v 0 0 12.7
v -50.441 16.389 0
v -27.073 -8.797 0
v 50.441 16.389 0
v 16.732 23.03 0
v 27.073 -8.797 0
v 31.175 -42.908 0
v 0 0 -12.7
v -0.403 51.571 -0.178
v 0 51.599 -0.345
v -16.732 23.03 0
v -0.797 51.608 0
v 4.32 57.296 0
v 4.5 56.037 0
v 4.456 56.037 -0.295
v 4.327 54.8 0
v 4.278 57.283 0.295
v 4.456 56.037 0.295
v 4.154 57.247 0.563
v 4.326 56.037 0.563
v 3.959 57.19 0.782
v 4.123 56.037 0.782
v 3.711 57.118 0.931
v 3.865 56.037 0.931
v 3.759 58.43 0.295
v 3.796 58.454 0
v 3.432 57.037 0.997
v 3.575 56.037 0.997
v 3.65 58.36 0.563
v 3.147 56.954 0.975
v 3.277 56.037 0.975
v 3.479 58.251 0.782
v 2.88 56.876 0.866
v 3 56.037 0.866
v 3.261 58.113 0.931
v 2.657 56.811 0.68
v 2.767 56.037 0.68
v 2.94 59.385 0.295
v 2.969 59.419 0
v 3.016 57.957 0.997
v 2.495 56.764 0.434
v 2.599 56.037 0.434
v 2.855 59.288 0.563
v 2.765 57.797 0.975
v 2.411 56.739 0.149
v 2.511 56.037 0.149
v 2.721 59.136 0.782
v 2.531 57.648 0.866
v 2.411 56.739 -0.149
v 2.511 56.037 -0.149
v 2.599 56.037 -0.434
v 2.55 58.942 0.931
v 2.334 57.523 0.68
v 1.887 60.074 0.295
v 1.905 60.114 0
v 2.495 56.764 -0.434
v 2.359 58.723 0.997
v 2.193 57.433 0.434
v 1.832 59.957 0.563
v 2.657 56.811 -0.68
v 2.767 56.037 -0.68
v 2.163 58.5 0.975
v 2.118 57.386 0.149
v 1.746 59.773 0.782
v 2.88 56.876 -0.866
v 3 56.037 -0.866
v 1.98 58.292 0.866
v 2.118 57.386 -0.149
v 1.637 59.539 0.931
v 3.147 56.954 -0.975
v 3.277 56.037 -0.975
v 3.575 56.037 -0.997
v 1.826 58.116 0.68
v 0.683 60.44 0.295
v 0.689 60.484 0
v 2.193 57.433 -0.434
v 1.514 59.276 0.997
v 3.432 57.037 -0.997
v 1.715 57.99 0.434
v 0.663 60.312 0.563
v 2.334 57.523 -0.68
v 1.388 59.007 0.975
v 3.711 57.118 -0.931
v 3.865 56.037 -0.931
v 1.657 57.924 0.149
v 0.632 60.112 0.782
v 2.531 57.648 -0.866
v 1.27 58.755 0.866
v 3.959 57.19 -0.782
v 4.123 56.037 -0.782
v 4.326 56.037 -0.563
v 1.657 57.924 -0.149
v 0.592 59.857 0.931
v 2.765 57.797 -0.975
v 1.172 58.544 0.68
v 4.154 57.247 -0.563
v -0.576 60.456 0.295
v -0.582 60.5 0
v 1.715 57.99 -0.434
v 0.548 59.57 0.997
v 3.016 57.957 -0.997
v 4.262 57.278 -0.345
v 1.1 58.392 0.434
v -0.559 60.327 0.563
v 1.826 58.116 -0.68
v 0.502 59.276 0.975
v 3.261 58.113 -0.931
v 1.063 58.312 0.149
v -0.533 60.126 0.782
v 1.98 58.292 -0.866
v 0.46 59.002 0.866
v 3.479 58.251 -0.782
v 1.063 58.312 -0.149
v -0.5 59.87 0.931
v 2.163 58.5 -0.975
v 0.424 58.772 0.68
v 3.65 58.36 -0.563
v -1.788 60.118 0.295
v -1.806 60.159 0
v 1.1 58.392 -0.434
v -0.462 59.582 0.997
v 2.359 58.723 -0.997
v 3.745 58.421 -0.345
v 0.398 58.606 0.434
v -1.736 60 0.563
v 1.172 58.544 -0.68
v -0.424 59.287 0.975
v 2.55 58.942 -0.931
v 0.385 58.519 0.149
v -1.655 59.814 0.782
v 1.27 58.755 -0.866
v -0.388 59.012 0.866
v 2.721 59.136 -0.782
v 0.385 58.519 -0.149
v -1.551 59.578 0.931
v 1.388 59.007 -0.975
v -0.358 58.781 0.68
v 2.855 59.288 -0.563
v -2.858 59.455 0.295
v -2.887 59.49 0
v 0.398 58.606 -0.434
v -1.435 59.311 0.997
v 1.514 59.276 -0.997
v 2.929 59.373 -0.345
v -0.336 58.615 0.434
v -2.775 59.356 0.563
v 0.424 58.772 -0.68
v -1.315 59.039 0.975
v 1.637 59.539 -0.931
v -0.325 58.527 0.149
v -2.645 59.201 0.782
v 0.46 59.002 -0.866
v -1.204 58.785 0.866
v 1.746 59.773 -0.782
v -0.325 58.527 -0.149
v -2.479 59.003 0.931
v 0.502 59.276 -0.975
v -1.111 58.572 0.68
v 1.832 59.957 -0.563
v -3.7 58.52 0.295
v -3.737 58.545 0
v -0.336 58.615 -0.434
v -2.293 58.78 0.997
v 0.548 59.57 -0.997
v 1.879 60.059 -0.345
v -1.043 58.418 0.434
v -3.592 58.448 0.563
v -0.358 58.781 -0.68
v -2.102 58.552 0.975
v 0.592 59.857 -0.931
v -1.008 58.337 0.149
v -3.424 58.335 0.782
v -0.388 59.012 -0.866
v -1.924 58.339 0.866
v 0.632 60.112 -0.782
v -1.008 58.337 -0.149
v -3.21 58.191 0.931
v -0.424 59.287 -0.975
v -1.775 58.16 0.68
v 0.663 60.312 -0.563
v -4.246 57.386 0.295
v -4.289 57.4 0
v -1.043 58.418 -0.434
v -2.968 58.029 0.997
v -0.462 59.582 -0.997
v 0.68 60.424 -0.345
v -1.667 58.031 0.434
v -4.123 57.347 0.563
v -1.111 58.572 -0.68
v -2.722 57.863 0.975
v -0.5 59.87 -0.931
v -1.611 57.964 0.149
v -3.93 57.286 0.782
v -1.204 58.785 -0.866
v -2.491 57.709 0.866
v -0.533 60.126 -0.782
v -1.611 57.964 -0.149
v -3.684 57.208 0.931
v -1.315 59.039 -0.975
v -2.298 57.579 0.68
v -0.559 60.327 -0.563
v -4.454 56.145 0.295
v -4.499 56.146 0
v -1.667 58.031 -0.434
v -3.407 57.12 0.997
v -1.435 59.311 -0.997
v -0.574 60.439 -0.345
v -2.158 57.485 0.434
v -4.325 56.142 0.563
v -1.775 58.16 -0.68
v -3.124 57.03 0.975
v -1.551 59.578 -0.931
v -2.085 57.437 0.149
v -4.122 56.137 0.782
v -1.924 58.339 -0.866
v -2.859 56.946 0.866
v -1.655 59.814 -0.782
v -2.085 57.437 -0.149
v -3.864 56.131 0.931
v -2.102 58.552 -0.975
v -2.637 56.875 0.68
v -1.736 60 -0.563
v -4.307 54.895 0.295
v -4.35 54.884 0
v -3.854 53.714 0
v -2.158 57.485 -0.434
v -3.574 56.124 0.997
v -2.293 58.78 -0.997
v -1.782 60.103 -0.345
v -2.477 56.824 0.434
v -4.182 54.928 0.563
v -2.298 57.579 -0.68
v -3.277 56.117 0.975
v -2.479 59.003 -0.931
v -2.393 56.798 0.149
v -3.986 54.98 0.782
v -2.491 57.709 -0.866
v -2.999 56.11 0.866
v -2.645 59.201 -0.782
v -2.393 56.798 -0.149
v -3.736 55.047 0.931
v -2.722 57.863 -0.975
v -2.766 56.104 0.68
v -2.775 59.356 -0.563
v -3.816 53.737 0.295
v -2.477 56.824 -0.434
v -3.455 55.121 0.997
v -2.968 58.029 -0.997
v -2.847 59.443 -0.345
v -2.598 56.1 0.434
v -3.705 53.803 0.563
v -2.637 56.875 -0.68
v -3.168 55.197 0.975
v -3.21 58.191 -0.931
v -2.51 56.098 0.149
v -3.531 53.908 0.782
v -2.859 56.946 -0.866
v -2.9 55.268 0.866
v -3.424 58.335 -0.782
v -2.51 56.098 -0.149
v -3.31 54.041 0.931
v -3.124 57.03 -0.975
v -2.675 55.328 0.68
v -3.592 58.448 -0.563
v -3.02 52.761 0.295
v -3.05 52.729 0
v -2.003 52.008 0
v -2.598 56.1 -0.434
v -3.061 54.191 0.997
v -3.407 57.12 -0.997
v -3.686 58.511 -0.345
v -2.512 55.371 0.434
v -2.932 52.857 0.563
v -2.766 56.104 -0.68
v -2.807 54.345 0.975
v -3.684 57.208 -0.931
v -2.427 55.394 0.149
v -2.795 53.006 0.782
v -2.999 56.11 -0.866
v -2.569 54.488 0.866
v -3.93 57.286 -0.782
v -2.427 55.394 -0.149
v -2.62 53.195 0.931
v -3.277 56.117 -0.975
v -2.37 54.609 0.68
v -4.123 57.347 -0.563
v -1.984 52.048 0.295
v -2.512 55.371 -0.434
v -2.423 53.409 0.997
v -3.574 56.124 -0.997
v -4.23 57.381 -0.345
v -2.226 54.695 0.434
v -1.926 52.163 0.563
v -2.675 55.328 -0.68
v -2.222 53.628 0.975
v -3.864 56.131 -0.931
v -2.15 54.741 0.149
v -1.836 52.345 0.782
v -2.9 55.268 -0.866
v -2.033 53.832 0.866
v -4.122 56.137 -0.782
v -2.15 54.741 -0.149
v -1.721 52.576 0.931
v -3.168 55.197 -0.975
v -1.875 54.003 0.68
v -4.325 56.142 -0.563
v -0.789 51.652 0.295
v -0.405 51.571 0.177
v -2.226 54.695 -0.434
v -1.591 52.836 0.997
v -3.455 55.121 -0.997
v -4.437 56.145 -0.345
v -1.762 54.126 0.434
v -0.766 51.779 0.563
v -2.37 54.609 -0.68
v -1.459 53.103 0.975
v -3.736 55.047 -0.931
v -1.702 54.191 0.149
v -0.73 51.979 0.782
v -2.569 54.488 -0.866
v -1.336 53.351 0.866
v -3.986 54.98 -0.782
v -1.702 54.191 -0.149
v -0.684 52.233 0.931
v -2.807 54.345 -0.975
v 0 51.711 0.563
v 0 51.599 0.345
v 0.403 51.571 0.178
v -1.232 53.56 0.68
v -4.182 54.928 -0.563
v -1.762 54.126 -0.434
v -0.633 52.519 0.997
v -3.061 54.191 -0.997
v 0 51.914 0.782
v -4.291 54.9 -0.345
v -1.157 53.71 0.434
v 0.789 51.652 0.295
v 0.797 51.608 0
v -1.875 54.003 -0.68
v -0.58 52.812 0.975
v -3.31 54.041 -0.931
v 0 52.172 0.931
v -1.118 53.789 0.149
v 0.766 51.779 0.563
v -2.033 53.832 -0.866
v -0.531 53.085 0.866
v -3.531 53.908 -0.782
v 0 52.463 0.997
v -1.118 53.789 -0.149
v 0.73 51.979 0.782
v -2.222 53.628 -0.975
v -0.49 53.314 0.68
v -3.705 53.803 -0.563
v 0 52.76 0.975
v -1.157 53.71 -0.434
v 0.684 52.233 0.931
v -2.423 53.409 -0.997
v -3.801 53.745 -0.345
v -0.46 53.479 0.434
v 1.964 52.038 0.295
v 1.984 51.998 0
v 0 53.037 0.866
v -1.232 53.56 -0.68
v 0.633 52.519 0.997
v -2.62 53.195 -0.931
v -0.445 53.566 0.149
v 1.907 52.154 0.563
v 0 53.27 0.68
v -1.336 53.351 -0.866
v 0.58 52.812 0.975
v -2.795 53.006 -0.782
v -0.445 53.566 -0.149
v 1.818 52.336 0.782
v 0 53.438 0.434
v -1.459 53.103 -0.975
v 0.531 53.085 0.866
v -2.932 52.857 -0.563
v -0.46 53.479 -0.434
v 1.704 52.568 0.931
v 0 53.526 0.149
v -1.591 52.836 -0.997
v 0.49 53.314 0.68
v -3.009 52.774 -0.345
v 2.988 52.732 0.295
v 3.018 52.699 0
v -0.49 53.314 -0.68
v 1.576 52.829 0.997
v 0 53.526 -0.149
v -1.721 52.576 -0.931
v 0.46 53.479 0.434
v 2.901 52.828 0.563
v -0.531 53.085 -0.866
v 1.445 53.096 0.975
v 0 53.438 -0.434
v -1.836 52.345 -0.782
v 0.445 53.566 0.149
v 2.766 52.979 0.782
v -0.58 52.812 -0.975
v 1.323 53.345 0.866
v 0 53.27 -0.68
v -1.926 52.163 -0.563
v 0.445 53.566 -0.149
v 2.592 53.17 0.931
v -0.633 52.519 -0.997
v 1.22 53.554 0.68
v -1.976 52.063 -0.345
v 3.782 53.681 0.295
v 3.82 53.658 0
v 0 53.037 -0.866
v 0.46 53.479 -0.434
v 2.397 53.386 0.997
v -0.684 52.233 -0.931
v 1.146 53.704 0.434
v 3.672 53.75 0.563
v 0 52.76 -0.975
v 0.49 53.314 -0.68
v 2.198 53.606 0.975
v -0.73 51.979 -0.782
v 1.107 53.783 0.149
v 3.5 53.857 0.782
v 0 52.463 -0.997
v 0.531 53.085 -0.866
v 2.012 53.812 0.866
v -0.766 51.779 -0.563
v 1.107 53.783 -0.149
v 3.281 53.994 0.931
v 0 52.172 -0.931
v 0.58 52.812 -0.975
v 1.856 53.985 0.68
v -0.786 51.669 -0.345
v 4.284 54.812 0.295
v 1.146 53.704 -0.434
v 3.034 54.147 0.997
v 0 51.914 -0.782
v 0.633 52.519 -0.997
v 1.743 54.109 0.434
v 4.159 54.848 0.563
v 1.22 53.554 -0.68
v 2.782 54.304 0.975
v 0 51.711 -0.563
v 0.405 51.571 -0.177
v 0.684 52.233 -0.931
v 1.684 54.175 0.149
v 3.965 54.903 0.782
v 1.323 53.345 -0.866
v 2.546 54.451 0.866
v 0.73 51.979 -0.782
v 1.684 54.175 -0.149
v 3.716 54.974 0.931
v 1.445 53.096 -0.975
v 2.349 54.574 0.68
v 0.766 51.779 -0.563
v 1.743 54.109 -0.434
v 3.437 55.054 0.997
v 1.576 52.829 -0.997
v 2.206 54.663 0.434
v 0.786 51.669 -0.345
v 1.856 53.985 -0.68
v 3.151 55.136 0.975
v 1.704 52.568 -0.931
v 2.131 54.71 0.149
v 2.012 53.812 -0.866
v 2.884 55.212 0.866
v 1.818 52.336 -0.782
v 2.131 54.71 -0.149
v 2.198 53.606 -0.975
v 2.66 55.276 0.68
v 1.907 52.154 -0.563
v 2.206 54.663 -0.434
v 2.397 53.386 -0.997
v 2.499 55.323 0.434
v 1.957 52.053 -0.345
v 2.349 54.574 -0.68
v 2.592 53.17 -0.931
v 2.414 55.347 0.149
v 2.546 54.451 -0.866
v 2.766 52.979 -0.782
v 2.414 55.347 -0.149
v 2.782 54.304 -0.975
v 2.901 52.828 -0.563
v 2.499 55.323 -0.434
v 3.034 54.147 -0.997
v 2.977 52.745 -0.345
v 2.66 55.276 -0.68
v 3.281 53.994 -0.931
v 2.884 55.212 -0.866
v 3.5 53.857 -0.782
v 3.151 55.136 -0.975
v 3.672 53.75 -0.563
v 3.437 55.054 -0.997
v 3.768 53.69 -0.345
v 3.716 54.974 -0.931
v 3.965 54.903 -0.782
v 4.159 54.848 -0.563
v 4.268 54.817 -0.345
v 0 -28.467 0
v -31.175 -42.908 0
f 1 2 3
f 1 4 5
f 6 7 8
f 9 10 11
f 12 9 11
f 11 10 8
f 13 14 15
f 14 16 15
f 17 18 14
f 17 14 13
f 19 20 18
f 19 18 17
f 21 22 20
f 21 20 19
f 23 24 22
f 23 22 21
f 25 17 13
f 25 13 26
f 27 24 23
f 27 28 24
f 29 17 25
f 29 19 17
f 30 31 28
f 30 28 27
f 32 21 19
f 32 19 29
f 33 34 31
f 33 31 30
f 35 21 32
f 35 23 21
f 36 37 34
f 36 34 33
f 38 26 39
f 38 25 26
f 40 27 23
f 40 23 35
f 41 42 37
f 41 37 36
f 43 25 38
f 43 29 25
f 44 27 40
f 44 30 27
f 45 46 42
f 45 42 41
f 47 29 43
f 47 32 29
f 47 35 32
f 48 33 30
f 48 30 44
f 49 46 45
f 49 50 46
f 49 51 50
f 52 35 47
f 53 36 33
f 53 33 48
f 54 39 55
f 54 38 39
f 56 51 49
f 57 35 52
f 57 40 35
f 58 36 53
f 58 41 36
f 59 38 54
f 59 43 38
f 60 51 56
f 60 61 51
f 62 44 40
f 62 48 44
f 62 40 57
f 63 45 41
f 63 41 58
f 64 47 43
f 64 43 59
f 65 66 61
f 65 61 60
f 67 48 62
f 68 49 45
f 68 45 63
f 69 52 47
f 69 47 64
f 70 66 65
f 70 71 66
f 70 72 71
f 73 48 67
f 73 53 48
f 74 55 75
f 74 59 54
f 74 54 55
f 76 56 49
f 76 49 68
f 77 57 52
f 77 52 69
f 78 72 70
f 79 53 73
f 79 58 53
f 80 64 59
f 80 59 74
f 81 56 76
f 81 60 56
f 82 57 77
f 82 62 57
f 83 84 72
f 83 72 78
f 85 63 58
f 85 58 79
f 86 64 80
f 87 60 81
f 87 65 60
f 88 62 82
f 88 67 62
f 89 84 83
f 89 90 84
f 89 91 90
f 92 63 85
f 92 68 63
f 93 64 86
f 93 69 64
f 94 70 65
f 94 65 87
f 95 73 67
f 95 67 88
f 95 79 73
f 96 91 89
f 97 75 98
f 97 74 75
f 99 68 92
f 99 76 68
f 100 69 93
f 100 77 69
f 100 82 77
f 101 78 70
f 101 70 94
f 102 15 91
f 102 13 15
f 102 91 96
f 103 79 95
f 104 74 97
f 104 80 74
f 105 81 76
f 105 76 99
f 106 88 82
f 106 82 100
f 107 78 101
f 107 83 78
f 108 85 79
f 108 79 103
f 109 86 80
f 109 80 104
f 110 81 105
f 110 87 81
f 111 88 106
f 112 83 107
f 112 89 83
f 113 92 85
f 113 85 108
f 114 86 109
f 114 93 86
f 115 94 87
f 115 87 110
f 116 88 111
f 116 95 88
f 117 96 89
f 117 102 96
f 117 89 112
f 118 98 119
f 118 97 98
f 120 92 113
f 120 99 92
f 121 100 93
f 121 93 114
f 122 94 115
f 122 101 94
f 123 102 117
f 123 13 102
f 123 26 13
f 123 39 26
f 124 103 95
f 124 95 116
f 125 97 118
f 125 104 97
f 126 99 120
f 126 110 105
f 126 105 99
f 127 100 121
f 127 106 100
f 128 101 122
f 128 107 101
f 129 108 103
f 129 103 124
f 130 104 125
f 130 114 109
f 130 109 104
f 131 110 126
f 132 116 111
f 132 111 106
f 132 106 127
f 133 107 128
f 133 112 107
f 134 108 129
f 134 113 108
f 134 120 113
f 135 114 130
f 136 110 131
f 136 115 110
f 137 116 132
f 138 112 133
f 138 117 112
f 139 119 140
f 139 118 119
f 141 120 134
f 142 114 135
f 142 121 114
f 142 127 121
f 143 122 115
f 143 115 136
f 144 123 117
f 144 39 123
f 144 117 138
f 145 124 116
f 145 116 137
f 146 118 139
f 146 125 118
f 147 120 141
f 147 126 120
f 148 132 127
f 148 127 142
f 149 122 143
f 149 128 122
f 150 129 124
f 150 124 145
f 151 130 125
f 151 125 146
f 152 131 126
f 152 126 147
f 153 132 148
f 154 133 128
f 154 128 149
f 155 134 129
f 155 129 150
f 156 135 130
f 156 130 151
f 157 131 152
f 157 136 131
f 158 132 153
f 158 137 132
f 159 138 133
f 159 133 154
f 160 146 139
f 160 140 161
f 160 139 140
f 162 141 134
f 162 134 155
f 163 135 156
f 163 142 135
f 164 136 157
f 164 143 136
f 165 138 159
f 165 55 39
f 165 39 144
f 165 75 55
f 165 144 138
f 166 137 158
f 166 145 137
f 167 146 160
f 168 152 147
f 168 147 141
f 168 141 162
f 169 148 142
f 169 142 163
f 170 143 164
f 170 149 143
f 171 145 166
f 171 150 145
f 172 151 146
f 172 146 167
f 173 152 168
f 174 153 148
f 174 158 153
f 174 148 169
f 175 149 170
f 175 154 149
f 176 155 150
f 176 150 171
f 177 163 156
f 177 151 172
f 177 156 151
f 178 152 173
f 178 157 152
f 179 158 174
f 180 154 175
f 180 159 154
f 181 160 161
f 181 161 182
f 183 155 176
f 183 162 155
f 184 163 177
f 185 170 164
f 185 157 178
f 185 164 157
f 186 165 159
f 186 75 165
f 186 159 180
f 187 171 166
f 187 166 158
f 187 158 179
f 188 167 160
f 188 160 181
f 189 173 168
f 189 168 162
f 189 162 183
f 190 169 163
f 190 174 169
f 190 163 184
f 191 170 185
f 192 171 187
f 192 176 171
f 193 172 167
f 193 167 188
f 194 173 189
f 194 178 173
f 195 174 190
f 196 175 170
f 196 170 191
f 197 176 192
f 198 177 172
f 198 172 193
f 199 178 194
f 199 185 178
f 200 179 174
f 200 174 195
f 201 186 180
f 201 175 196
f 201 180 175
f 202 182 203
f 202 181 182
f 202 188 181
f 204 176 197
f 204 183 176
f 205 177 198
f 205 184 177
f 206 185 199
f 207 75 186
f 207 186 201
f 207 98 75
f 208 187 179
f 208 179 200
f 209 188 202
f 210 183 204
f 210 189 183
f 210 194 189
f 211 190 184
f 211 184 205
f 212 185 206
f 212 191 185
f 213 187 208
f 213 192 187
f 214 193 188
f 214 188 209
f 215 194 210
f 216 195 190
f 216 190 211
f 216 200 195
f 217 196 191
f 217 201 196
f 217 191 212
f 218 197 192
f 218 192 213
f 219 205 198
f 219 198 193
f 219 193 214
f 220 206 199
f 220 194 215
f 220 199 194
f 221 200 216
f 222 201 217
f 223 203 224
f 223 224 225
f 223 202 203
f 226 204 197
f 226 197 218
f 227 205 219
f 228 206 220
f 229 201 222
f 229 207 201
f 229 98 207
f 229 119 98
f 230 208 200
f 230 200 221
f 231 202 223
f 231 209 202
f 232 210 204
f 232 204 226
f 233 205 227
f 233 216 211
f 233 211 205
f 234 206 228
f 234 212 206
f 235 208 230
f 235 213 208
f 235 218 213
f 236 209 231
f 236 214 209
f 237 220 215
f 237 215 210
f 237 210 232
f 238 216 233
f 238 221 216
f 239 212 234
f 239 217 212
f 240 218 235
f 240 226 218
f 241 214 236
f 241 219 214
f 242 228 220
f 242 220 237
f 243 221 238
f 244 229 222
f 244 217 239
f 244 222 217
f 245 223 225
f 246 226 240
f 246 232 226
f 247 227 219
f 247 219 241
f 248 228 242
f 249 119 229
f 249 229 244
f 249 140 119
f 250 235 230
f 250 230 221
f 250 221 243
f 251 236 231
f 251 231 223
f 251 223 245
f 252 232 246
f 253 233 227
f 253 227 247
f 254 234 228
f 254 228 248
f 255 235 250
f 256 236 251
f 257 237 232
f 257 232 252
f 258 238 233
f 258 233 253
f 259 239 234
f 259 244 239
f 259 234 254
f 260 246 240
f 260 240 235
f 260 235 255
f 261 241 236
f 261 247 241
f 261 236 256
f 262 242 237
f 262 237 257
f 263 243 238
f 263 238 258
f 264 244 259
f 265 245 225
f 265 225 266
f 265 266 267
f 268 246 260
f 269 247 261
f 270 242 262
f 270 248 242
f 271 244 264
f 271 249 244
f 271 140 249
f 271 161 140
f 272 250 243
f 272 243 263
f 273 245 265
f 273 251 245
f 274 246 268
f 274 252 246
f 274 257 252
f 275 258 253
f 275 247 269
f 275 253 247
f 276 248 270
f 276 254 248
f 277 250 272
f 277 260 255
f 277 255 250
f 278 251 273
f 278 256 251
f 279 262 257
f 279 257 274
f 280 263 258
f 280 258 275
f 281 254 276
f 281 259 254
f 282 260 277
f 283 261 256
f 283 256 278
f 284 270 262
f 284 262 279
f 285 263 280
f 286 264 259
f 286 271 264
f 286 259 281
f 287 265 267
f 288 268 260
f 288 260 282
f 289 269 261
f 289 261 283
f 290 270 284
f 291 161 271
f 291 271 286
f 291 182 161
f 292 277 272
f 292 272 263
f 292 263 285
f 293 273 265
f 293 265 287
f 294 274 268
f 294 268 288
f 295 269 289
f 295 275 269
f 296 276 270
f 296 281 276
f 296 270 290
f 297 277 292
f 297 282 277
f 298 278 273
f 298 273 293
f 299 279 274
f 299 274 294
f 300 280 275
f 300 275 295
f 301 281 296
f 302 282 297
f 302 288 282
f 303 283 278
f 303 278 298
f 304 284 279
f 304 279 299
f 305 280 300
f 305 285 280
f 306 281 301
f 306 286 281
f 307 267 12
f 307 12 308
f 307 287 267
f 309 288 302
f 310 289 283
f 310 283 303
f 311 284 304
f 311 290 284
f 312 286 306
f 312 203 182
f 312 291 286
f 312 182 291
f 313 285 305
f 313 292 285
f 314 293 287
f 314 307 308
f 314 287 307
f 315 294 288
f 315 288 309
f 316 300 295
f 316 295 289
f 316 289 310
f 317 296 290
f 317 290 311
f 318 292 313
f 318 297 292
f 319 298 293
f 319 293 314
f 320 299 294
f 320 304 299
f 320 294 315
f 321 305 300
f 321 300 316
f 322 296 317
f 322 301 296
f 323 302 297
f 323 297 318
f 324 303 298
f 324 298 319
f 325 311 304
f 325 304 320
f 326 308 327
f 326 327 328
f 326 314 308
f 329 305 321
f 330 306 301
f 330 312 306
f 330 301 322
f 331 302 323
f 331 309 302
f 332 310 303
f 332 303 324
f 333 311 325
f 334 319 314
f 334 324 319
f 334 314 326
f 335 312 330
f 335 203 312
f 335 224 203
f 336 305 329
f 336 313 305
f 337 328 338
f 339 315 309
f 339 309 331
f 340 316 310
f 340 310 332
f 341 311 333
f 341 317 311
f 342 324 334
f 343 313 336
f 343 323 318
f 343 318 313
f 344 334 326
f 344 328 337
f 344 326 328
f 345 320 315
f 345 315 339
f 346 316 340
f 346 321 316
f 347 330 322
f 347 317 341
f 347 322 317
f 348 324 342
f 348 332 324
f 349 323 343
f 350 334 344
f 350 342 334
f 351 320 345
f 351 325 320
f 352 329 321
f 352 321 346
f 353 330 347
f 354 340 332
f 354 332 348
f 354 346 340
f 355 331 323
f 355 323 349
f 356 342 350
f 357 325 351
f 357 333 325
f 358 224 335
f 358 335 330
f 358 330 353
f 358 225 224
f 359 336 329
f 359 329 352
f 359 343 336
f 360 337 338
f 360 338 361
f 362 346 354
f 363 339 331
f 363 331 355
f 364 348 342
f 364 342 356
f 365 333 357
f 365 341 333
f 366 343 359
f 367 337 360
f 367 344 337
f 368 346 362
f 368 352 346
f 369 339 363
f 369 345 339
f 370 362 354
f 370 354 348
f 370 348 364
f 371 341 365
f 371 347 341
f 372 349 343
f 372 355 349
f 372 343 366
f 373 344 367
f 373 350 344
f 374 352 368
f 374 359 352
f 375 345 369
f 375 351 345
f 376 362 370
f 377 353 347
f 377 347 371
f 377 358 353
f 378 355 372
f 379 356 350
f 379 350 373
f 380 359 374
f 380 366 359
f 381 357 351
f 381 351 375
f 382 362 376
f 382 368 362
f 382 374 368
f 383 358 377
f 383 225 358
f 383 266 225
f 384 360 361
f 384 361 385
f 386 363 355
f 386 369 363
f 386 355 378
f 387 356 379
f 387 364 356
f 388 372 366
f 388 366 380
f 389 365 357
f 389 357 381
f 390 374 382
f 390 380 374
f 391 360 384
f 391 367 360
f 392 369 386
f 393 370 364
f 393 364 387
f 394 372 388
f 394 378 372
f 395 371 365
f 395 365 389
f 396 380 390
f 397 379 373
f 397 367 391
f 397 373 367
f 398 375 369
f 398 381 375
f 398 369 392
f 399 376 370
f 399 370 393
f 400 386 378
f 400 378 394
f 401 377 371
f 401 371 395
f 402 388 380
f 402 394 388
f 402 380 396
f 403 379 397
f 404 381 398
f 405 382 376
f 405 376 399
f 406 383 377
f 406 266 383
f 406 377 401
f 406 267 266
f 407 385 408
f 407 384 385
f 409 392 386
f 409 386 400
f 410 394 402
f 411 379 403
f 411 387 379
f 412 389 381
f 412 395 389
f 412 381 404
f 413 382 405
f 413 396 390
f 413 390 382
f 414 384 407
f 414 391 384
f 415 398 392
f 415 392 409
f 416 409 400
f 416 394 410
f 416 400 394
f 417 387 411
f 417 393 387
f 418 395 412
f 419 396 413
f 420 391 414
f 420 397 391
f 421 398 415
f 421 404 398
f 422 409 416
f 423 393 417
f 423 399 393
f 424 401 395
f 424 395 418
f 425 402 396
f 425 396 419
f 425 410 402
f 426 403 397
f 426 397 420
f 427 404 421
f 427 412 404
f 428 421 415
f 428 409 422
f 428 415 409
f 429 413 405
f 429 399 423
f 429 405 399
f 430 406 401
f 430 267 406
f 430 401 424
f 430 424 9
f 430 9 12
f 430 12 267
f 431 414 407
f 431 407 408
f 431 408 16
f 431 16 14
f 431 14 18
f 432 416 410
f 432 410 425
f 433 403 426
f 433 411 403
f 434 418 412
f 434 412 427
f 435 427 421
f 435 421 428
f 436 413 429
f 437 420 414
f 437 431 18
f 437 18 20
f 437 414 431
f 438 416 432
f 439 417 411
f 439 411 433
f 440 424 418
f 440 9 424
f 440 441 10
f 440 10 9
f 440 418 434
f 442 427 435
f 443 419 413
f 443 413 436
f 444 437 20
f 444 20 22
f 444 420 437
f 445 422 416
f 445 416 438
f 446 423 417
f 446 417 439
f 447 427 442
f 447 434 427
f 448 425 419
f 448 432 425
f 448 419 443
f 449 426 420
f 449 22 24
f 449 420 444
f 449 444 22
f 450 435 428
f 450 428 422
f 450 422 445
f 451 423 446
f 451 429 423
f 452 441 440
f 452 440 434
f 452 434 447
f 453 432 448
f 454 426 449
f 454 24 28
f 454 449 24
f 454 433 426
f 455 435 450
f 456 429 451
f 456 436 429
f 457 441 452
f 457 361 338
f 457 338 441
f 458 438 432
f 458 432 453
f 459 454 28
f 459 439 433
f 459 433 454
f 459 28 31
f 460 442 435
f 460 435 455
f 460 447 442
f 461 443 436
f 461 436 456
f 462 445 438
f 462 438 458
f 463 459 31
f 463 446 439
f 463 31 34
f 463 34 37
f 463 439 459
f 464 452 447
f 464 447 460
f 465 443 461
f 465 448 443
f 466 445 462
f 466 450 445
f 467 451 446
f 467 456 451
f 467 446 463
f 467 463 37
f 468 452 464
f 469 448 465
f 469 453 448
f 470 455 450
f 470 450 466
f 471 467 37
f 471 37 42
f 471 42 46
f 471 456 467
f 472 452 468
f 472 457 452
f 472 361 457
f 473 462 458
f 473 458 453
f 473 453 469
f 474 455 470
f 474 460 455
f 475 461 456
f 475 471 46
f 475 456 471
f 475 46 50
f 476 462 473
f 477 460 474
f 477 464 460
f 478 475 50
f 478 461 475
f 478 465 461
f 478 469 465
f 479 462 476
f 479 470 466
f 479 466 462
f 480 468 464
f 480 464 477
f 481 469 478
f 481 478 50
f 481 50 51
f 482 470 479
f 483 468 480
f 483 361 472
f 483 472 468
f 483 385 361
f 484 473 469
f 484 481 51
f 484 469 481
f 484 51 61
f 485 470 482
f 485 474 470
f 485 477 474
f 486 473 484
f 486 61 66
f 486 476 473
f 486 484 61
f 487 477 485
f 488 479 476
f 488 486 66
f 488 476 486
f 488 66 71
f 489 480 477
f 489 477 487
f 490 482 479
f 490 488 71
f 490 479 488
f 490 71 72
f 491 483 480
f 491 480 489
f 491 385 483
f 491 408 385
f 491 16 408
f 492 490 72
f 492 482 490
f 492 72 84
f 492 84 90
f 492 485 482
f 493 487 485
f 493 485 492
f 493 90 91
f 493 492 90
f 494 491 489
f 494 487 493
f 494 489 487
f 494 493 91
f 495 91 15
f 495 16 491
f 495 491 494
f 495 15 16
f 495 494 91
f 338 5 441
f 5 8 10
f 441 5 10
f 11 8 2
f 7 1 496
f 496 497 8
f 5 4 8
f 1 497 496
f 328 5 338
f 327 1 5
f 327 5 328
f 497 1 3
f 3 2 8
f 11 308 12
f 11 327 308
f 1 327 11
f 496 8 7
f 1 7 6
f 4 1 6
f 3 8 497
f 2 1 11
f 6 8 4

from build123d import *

# Parameters (mm, degrees)
F6_R = 1


with BuildPart() as f3:
    # F0 (on Top) → F3 section 0
    with BuildSketch(Plane.XY, mode=Mode.PRIVATE) as f3_s0:
        Polygon((16.732227, 23.029935), (0, 53.037316), (-16.732227, 23.029935), (-50.441485, 16.389432), (-27.073313, -8.796653), (-31.174552, -42.90809), (0, -28.466566), (31.174552, -42.90809), (27.073313, -8.796653), (50.441485, 16.389432), align=None)
    loft([f3_s0.sketch, Vertex(0, 0, 12.7)])

    # F4: F3 across plane


with BuildPart() as f3_1:
    add(f3.part)
    add(f3.part.mirror(Plane.XY))

    # F7: sweep along a path in F5
    with BuildLine(Plane.XY) as f7_path:
        CenterArc((0, 56.037316), 3.75, 0, 360)
    # F6 (on Right) → F7 (sweep)
    with BuildSketch(Plane.YZ):
        with Locations((59.537316, 0)):
            Circle(F6_R)
    sweep(path=f7_path.line)


solid = f3_1.part
